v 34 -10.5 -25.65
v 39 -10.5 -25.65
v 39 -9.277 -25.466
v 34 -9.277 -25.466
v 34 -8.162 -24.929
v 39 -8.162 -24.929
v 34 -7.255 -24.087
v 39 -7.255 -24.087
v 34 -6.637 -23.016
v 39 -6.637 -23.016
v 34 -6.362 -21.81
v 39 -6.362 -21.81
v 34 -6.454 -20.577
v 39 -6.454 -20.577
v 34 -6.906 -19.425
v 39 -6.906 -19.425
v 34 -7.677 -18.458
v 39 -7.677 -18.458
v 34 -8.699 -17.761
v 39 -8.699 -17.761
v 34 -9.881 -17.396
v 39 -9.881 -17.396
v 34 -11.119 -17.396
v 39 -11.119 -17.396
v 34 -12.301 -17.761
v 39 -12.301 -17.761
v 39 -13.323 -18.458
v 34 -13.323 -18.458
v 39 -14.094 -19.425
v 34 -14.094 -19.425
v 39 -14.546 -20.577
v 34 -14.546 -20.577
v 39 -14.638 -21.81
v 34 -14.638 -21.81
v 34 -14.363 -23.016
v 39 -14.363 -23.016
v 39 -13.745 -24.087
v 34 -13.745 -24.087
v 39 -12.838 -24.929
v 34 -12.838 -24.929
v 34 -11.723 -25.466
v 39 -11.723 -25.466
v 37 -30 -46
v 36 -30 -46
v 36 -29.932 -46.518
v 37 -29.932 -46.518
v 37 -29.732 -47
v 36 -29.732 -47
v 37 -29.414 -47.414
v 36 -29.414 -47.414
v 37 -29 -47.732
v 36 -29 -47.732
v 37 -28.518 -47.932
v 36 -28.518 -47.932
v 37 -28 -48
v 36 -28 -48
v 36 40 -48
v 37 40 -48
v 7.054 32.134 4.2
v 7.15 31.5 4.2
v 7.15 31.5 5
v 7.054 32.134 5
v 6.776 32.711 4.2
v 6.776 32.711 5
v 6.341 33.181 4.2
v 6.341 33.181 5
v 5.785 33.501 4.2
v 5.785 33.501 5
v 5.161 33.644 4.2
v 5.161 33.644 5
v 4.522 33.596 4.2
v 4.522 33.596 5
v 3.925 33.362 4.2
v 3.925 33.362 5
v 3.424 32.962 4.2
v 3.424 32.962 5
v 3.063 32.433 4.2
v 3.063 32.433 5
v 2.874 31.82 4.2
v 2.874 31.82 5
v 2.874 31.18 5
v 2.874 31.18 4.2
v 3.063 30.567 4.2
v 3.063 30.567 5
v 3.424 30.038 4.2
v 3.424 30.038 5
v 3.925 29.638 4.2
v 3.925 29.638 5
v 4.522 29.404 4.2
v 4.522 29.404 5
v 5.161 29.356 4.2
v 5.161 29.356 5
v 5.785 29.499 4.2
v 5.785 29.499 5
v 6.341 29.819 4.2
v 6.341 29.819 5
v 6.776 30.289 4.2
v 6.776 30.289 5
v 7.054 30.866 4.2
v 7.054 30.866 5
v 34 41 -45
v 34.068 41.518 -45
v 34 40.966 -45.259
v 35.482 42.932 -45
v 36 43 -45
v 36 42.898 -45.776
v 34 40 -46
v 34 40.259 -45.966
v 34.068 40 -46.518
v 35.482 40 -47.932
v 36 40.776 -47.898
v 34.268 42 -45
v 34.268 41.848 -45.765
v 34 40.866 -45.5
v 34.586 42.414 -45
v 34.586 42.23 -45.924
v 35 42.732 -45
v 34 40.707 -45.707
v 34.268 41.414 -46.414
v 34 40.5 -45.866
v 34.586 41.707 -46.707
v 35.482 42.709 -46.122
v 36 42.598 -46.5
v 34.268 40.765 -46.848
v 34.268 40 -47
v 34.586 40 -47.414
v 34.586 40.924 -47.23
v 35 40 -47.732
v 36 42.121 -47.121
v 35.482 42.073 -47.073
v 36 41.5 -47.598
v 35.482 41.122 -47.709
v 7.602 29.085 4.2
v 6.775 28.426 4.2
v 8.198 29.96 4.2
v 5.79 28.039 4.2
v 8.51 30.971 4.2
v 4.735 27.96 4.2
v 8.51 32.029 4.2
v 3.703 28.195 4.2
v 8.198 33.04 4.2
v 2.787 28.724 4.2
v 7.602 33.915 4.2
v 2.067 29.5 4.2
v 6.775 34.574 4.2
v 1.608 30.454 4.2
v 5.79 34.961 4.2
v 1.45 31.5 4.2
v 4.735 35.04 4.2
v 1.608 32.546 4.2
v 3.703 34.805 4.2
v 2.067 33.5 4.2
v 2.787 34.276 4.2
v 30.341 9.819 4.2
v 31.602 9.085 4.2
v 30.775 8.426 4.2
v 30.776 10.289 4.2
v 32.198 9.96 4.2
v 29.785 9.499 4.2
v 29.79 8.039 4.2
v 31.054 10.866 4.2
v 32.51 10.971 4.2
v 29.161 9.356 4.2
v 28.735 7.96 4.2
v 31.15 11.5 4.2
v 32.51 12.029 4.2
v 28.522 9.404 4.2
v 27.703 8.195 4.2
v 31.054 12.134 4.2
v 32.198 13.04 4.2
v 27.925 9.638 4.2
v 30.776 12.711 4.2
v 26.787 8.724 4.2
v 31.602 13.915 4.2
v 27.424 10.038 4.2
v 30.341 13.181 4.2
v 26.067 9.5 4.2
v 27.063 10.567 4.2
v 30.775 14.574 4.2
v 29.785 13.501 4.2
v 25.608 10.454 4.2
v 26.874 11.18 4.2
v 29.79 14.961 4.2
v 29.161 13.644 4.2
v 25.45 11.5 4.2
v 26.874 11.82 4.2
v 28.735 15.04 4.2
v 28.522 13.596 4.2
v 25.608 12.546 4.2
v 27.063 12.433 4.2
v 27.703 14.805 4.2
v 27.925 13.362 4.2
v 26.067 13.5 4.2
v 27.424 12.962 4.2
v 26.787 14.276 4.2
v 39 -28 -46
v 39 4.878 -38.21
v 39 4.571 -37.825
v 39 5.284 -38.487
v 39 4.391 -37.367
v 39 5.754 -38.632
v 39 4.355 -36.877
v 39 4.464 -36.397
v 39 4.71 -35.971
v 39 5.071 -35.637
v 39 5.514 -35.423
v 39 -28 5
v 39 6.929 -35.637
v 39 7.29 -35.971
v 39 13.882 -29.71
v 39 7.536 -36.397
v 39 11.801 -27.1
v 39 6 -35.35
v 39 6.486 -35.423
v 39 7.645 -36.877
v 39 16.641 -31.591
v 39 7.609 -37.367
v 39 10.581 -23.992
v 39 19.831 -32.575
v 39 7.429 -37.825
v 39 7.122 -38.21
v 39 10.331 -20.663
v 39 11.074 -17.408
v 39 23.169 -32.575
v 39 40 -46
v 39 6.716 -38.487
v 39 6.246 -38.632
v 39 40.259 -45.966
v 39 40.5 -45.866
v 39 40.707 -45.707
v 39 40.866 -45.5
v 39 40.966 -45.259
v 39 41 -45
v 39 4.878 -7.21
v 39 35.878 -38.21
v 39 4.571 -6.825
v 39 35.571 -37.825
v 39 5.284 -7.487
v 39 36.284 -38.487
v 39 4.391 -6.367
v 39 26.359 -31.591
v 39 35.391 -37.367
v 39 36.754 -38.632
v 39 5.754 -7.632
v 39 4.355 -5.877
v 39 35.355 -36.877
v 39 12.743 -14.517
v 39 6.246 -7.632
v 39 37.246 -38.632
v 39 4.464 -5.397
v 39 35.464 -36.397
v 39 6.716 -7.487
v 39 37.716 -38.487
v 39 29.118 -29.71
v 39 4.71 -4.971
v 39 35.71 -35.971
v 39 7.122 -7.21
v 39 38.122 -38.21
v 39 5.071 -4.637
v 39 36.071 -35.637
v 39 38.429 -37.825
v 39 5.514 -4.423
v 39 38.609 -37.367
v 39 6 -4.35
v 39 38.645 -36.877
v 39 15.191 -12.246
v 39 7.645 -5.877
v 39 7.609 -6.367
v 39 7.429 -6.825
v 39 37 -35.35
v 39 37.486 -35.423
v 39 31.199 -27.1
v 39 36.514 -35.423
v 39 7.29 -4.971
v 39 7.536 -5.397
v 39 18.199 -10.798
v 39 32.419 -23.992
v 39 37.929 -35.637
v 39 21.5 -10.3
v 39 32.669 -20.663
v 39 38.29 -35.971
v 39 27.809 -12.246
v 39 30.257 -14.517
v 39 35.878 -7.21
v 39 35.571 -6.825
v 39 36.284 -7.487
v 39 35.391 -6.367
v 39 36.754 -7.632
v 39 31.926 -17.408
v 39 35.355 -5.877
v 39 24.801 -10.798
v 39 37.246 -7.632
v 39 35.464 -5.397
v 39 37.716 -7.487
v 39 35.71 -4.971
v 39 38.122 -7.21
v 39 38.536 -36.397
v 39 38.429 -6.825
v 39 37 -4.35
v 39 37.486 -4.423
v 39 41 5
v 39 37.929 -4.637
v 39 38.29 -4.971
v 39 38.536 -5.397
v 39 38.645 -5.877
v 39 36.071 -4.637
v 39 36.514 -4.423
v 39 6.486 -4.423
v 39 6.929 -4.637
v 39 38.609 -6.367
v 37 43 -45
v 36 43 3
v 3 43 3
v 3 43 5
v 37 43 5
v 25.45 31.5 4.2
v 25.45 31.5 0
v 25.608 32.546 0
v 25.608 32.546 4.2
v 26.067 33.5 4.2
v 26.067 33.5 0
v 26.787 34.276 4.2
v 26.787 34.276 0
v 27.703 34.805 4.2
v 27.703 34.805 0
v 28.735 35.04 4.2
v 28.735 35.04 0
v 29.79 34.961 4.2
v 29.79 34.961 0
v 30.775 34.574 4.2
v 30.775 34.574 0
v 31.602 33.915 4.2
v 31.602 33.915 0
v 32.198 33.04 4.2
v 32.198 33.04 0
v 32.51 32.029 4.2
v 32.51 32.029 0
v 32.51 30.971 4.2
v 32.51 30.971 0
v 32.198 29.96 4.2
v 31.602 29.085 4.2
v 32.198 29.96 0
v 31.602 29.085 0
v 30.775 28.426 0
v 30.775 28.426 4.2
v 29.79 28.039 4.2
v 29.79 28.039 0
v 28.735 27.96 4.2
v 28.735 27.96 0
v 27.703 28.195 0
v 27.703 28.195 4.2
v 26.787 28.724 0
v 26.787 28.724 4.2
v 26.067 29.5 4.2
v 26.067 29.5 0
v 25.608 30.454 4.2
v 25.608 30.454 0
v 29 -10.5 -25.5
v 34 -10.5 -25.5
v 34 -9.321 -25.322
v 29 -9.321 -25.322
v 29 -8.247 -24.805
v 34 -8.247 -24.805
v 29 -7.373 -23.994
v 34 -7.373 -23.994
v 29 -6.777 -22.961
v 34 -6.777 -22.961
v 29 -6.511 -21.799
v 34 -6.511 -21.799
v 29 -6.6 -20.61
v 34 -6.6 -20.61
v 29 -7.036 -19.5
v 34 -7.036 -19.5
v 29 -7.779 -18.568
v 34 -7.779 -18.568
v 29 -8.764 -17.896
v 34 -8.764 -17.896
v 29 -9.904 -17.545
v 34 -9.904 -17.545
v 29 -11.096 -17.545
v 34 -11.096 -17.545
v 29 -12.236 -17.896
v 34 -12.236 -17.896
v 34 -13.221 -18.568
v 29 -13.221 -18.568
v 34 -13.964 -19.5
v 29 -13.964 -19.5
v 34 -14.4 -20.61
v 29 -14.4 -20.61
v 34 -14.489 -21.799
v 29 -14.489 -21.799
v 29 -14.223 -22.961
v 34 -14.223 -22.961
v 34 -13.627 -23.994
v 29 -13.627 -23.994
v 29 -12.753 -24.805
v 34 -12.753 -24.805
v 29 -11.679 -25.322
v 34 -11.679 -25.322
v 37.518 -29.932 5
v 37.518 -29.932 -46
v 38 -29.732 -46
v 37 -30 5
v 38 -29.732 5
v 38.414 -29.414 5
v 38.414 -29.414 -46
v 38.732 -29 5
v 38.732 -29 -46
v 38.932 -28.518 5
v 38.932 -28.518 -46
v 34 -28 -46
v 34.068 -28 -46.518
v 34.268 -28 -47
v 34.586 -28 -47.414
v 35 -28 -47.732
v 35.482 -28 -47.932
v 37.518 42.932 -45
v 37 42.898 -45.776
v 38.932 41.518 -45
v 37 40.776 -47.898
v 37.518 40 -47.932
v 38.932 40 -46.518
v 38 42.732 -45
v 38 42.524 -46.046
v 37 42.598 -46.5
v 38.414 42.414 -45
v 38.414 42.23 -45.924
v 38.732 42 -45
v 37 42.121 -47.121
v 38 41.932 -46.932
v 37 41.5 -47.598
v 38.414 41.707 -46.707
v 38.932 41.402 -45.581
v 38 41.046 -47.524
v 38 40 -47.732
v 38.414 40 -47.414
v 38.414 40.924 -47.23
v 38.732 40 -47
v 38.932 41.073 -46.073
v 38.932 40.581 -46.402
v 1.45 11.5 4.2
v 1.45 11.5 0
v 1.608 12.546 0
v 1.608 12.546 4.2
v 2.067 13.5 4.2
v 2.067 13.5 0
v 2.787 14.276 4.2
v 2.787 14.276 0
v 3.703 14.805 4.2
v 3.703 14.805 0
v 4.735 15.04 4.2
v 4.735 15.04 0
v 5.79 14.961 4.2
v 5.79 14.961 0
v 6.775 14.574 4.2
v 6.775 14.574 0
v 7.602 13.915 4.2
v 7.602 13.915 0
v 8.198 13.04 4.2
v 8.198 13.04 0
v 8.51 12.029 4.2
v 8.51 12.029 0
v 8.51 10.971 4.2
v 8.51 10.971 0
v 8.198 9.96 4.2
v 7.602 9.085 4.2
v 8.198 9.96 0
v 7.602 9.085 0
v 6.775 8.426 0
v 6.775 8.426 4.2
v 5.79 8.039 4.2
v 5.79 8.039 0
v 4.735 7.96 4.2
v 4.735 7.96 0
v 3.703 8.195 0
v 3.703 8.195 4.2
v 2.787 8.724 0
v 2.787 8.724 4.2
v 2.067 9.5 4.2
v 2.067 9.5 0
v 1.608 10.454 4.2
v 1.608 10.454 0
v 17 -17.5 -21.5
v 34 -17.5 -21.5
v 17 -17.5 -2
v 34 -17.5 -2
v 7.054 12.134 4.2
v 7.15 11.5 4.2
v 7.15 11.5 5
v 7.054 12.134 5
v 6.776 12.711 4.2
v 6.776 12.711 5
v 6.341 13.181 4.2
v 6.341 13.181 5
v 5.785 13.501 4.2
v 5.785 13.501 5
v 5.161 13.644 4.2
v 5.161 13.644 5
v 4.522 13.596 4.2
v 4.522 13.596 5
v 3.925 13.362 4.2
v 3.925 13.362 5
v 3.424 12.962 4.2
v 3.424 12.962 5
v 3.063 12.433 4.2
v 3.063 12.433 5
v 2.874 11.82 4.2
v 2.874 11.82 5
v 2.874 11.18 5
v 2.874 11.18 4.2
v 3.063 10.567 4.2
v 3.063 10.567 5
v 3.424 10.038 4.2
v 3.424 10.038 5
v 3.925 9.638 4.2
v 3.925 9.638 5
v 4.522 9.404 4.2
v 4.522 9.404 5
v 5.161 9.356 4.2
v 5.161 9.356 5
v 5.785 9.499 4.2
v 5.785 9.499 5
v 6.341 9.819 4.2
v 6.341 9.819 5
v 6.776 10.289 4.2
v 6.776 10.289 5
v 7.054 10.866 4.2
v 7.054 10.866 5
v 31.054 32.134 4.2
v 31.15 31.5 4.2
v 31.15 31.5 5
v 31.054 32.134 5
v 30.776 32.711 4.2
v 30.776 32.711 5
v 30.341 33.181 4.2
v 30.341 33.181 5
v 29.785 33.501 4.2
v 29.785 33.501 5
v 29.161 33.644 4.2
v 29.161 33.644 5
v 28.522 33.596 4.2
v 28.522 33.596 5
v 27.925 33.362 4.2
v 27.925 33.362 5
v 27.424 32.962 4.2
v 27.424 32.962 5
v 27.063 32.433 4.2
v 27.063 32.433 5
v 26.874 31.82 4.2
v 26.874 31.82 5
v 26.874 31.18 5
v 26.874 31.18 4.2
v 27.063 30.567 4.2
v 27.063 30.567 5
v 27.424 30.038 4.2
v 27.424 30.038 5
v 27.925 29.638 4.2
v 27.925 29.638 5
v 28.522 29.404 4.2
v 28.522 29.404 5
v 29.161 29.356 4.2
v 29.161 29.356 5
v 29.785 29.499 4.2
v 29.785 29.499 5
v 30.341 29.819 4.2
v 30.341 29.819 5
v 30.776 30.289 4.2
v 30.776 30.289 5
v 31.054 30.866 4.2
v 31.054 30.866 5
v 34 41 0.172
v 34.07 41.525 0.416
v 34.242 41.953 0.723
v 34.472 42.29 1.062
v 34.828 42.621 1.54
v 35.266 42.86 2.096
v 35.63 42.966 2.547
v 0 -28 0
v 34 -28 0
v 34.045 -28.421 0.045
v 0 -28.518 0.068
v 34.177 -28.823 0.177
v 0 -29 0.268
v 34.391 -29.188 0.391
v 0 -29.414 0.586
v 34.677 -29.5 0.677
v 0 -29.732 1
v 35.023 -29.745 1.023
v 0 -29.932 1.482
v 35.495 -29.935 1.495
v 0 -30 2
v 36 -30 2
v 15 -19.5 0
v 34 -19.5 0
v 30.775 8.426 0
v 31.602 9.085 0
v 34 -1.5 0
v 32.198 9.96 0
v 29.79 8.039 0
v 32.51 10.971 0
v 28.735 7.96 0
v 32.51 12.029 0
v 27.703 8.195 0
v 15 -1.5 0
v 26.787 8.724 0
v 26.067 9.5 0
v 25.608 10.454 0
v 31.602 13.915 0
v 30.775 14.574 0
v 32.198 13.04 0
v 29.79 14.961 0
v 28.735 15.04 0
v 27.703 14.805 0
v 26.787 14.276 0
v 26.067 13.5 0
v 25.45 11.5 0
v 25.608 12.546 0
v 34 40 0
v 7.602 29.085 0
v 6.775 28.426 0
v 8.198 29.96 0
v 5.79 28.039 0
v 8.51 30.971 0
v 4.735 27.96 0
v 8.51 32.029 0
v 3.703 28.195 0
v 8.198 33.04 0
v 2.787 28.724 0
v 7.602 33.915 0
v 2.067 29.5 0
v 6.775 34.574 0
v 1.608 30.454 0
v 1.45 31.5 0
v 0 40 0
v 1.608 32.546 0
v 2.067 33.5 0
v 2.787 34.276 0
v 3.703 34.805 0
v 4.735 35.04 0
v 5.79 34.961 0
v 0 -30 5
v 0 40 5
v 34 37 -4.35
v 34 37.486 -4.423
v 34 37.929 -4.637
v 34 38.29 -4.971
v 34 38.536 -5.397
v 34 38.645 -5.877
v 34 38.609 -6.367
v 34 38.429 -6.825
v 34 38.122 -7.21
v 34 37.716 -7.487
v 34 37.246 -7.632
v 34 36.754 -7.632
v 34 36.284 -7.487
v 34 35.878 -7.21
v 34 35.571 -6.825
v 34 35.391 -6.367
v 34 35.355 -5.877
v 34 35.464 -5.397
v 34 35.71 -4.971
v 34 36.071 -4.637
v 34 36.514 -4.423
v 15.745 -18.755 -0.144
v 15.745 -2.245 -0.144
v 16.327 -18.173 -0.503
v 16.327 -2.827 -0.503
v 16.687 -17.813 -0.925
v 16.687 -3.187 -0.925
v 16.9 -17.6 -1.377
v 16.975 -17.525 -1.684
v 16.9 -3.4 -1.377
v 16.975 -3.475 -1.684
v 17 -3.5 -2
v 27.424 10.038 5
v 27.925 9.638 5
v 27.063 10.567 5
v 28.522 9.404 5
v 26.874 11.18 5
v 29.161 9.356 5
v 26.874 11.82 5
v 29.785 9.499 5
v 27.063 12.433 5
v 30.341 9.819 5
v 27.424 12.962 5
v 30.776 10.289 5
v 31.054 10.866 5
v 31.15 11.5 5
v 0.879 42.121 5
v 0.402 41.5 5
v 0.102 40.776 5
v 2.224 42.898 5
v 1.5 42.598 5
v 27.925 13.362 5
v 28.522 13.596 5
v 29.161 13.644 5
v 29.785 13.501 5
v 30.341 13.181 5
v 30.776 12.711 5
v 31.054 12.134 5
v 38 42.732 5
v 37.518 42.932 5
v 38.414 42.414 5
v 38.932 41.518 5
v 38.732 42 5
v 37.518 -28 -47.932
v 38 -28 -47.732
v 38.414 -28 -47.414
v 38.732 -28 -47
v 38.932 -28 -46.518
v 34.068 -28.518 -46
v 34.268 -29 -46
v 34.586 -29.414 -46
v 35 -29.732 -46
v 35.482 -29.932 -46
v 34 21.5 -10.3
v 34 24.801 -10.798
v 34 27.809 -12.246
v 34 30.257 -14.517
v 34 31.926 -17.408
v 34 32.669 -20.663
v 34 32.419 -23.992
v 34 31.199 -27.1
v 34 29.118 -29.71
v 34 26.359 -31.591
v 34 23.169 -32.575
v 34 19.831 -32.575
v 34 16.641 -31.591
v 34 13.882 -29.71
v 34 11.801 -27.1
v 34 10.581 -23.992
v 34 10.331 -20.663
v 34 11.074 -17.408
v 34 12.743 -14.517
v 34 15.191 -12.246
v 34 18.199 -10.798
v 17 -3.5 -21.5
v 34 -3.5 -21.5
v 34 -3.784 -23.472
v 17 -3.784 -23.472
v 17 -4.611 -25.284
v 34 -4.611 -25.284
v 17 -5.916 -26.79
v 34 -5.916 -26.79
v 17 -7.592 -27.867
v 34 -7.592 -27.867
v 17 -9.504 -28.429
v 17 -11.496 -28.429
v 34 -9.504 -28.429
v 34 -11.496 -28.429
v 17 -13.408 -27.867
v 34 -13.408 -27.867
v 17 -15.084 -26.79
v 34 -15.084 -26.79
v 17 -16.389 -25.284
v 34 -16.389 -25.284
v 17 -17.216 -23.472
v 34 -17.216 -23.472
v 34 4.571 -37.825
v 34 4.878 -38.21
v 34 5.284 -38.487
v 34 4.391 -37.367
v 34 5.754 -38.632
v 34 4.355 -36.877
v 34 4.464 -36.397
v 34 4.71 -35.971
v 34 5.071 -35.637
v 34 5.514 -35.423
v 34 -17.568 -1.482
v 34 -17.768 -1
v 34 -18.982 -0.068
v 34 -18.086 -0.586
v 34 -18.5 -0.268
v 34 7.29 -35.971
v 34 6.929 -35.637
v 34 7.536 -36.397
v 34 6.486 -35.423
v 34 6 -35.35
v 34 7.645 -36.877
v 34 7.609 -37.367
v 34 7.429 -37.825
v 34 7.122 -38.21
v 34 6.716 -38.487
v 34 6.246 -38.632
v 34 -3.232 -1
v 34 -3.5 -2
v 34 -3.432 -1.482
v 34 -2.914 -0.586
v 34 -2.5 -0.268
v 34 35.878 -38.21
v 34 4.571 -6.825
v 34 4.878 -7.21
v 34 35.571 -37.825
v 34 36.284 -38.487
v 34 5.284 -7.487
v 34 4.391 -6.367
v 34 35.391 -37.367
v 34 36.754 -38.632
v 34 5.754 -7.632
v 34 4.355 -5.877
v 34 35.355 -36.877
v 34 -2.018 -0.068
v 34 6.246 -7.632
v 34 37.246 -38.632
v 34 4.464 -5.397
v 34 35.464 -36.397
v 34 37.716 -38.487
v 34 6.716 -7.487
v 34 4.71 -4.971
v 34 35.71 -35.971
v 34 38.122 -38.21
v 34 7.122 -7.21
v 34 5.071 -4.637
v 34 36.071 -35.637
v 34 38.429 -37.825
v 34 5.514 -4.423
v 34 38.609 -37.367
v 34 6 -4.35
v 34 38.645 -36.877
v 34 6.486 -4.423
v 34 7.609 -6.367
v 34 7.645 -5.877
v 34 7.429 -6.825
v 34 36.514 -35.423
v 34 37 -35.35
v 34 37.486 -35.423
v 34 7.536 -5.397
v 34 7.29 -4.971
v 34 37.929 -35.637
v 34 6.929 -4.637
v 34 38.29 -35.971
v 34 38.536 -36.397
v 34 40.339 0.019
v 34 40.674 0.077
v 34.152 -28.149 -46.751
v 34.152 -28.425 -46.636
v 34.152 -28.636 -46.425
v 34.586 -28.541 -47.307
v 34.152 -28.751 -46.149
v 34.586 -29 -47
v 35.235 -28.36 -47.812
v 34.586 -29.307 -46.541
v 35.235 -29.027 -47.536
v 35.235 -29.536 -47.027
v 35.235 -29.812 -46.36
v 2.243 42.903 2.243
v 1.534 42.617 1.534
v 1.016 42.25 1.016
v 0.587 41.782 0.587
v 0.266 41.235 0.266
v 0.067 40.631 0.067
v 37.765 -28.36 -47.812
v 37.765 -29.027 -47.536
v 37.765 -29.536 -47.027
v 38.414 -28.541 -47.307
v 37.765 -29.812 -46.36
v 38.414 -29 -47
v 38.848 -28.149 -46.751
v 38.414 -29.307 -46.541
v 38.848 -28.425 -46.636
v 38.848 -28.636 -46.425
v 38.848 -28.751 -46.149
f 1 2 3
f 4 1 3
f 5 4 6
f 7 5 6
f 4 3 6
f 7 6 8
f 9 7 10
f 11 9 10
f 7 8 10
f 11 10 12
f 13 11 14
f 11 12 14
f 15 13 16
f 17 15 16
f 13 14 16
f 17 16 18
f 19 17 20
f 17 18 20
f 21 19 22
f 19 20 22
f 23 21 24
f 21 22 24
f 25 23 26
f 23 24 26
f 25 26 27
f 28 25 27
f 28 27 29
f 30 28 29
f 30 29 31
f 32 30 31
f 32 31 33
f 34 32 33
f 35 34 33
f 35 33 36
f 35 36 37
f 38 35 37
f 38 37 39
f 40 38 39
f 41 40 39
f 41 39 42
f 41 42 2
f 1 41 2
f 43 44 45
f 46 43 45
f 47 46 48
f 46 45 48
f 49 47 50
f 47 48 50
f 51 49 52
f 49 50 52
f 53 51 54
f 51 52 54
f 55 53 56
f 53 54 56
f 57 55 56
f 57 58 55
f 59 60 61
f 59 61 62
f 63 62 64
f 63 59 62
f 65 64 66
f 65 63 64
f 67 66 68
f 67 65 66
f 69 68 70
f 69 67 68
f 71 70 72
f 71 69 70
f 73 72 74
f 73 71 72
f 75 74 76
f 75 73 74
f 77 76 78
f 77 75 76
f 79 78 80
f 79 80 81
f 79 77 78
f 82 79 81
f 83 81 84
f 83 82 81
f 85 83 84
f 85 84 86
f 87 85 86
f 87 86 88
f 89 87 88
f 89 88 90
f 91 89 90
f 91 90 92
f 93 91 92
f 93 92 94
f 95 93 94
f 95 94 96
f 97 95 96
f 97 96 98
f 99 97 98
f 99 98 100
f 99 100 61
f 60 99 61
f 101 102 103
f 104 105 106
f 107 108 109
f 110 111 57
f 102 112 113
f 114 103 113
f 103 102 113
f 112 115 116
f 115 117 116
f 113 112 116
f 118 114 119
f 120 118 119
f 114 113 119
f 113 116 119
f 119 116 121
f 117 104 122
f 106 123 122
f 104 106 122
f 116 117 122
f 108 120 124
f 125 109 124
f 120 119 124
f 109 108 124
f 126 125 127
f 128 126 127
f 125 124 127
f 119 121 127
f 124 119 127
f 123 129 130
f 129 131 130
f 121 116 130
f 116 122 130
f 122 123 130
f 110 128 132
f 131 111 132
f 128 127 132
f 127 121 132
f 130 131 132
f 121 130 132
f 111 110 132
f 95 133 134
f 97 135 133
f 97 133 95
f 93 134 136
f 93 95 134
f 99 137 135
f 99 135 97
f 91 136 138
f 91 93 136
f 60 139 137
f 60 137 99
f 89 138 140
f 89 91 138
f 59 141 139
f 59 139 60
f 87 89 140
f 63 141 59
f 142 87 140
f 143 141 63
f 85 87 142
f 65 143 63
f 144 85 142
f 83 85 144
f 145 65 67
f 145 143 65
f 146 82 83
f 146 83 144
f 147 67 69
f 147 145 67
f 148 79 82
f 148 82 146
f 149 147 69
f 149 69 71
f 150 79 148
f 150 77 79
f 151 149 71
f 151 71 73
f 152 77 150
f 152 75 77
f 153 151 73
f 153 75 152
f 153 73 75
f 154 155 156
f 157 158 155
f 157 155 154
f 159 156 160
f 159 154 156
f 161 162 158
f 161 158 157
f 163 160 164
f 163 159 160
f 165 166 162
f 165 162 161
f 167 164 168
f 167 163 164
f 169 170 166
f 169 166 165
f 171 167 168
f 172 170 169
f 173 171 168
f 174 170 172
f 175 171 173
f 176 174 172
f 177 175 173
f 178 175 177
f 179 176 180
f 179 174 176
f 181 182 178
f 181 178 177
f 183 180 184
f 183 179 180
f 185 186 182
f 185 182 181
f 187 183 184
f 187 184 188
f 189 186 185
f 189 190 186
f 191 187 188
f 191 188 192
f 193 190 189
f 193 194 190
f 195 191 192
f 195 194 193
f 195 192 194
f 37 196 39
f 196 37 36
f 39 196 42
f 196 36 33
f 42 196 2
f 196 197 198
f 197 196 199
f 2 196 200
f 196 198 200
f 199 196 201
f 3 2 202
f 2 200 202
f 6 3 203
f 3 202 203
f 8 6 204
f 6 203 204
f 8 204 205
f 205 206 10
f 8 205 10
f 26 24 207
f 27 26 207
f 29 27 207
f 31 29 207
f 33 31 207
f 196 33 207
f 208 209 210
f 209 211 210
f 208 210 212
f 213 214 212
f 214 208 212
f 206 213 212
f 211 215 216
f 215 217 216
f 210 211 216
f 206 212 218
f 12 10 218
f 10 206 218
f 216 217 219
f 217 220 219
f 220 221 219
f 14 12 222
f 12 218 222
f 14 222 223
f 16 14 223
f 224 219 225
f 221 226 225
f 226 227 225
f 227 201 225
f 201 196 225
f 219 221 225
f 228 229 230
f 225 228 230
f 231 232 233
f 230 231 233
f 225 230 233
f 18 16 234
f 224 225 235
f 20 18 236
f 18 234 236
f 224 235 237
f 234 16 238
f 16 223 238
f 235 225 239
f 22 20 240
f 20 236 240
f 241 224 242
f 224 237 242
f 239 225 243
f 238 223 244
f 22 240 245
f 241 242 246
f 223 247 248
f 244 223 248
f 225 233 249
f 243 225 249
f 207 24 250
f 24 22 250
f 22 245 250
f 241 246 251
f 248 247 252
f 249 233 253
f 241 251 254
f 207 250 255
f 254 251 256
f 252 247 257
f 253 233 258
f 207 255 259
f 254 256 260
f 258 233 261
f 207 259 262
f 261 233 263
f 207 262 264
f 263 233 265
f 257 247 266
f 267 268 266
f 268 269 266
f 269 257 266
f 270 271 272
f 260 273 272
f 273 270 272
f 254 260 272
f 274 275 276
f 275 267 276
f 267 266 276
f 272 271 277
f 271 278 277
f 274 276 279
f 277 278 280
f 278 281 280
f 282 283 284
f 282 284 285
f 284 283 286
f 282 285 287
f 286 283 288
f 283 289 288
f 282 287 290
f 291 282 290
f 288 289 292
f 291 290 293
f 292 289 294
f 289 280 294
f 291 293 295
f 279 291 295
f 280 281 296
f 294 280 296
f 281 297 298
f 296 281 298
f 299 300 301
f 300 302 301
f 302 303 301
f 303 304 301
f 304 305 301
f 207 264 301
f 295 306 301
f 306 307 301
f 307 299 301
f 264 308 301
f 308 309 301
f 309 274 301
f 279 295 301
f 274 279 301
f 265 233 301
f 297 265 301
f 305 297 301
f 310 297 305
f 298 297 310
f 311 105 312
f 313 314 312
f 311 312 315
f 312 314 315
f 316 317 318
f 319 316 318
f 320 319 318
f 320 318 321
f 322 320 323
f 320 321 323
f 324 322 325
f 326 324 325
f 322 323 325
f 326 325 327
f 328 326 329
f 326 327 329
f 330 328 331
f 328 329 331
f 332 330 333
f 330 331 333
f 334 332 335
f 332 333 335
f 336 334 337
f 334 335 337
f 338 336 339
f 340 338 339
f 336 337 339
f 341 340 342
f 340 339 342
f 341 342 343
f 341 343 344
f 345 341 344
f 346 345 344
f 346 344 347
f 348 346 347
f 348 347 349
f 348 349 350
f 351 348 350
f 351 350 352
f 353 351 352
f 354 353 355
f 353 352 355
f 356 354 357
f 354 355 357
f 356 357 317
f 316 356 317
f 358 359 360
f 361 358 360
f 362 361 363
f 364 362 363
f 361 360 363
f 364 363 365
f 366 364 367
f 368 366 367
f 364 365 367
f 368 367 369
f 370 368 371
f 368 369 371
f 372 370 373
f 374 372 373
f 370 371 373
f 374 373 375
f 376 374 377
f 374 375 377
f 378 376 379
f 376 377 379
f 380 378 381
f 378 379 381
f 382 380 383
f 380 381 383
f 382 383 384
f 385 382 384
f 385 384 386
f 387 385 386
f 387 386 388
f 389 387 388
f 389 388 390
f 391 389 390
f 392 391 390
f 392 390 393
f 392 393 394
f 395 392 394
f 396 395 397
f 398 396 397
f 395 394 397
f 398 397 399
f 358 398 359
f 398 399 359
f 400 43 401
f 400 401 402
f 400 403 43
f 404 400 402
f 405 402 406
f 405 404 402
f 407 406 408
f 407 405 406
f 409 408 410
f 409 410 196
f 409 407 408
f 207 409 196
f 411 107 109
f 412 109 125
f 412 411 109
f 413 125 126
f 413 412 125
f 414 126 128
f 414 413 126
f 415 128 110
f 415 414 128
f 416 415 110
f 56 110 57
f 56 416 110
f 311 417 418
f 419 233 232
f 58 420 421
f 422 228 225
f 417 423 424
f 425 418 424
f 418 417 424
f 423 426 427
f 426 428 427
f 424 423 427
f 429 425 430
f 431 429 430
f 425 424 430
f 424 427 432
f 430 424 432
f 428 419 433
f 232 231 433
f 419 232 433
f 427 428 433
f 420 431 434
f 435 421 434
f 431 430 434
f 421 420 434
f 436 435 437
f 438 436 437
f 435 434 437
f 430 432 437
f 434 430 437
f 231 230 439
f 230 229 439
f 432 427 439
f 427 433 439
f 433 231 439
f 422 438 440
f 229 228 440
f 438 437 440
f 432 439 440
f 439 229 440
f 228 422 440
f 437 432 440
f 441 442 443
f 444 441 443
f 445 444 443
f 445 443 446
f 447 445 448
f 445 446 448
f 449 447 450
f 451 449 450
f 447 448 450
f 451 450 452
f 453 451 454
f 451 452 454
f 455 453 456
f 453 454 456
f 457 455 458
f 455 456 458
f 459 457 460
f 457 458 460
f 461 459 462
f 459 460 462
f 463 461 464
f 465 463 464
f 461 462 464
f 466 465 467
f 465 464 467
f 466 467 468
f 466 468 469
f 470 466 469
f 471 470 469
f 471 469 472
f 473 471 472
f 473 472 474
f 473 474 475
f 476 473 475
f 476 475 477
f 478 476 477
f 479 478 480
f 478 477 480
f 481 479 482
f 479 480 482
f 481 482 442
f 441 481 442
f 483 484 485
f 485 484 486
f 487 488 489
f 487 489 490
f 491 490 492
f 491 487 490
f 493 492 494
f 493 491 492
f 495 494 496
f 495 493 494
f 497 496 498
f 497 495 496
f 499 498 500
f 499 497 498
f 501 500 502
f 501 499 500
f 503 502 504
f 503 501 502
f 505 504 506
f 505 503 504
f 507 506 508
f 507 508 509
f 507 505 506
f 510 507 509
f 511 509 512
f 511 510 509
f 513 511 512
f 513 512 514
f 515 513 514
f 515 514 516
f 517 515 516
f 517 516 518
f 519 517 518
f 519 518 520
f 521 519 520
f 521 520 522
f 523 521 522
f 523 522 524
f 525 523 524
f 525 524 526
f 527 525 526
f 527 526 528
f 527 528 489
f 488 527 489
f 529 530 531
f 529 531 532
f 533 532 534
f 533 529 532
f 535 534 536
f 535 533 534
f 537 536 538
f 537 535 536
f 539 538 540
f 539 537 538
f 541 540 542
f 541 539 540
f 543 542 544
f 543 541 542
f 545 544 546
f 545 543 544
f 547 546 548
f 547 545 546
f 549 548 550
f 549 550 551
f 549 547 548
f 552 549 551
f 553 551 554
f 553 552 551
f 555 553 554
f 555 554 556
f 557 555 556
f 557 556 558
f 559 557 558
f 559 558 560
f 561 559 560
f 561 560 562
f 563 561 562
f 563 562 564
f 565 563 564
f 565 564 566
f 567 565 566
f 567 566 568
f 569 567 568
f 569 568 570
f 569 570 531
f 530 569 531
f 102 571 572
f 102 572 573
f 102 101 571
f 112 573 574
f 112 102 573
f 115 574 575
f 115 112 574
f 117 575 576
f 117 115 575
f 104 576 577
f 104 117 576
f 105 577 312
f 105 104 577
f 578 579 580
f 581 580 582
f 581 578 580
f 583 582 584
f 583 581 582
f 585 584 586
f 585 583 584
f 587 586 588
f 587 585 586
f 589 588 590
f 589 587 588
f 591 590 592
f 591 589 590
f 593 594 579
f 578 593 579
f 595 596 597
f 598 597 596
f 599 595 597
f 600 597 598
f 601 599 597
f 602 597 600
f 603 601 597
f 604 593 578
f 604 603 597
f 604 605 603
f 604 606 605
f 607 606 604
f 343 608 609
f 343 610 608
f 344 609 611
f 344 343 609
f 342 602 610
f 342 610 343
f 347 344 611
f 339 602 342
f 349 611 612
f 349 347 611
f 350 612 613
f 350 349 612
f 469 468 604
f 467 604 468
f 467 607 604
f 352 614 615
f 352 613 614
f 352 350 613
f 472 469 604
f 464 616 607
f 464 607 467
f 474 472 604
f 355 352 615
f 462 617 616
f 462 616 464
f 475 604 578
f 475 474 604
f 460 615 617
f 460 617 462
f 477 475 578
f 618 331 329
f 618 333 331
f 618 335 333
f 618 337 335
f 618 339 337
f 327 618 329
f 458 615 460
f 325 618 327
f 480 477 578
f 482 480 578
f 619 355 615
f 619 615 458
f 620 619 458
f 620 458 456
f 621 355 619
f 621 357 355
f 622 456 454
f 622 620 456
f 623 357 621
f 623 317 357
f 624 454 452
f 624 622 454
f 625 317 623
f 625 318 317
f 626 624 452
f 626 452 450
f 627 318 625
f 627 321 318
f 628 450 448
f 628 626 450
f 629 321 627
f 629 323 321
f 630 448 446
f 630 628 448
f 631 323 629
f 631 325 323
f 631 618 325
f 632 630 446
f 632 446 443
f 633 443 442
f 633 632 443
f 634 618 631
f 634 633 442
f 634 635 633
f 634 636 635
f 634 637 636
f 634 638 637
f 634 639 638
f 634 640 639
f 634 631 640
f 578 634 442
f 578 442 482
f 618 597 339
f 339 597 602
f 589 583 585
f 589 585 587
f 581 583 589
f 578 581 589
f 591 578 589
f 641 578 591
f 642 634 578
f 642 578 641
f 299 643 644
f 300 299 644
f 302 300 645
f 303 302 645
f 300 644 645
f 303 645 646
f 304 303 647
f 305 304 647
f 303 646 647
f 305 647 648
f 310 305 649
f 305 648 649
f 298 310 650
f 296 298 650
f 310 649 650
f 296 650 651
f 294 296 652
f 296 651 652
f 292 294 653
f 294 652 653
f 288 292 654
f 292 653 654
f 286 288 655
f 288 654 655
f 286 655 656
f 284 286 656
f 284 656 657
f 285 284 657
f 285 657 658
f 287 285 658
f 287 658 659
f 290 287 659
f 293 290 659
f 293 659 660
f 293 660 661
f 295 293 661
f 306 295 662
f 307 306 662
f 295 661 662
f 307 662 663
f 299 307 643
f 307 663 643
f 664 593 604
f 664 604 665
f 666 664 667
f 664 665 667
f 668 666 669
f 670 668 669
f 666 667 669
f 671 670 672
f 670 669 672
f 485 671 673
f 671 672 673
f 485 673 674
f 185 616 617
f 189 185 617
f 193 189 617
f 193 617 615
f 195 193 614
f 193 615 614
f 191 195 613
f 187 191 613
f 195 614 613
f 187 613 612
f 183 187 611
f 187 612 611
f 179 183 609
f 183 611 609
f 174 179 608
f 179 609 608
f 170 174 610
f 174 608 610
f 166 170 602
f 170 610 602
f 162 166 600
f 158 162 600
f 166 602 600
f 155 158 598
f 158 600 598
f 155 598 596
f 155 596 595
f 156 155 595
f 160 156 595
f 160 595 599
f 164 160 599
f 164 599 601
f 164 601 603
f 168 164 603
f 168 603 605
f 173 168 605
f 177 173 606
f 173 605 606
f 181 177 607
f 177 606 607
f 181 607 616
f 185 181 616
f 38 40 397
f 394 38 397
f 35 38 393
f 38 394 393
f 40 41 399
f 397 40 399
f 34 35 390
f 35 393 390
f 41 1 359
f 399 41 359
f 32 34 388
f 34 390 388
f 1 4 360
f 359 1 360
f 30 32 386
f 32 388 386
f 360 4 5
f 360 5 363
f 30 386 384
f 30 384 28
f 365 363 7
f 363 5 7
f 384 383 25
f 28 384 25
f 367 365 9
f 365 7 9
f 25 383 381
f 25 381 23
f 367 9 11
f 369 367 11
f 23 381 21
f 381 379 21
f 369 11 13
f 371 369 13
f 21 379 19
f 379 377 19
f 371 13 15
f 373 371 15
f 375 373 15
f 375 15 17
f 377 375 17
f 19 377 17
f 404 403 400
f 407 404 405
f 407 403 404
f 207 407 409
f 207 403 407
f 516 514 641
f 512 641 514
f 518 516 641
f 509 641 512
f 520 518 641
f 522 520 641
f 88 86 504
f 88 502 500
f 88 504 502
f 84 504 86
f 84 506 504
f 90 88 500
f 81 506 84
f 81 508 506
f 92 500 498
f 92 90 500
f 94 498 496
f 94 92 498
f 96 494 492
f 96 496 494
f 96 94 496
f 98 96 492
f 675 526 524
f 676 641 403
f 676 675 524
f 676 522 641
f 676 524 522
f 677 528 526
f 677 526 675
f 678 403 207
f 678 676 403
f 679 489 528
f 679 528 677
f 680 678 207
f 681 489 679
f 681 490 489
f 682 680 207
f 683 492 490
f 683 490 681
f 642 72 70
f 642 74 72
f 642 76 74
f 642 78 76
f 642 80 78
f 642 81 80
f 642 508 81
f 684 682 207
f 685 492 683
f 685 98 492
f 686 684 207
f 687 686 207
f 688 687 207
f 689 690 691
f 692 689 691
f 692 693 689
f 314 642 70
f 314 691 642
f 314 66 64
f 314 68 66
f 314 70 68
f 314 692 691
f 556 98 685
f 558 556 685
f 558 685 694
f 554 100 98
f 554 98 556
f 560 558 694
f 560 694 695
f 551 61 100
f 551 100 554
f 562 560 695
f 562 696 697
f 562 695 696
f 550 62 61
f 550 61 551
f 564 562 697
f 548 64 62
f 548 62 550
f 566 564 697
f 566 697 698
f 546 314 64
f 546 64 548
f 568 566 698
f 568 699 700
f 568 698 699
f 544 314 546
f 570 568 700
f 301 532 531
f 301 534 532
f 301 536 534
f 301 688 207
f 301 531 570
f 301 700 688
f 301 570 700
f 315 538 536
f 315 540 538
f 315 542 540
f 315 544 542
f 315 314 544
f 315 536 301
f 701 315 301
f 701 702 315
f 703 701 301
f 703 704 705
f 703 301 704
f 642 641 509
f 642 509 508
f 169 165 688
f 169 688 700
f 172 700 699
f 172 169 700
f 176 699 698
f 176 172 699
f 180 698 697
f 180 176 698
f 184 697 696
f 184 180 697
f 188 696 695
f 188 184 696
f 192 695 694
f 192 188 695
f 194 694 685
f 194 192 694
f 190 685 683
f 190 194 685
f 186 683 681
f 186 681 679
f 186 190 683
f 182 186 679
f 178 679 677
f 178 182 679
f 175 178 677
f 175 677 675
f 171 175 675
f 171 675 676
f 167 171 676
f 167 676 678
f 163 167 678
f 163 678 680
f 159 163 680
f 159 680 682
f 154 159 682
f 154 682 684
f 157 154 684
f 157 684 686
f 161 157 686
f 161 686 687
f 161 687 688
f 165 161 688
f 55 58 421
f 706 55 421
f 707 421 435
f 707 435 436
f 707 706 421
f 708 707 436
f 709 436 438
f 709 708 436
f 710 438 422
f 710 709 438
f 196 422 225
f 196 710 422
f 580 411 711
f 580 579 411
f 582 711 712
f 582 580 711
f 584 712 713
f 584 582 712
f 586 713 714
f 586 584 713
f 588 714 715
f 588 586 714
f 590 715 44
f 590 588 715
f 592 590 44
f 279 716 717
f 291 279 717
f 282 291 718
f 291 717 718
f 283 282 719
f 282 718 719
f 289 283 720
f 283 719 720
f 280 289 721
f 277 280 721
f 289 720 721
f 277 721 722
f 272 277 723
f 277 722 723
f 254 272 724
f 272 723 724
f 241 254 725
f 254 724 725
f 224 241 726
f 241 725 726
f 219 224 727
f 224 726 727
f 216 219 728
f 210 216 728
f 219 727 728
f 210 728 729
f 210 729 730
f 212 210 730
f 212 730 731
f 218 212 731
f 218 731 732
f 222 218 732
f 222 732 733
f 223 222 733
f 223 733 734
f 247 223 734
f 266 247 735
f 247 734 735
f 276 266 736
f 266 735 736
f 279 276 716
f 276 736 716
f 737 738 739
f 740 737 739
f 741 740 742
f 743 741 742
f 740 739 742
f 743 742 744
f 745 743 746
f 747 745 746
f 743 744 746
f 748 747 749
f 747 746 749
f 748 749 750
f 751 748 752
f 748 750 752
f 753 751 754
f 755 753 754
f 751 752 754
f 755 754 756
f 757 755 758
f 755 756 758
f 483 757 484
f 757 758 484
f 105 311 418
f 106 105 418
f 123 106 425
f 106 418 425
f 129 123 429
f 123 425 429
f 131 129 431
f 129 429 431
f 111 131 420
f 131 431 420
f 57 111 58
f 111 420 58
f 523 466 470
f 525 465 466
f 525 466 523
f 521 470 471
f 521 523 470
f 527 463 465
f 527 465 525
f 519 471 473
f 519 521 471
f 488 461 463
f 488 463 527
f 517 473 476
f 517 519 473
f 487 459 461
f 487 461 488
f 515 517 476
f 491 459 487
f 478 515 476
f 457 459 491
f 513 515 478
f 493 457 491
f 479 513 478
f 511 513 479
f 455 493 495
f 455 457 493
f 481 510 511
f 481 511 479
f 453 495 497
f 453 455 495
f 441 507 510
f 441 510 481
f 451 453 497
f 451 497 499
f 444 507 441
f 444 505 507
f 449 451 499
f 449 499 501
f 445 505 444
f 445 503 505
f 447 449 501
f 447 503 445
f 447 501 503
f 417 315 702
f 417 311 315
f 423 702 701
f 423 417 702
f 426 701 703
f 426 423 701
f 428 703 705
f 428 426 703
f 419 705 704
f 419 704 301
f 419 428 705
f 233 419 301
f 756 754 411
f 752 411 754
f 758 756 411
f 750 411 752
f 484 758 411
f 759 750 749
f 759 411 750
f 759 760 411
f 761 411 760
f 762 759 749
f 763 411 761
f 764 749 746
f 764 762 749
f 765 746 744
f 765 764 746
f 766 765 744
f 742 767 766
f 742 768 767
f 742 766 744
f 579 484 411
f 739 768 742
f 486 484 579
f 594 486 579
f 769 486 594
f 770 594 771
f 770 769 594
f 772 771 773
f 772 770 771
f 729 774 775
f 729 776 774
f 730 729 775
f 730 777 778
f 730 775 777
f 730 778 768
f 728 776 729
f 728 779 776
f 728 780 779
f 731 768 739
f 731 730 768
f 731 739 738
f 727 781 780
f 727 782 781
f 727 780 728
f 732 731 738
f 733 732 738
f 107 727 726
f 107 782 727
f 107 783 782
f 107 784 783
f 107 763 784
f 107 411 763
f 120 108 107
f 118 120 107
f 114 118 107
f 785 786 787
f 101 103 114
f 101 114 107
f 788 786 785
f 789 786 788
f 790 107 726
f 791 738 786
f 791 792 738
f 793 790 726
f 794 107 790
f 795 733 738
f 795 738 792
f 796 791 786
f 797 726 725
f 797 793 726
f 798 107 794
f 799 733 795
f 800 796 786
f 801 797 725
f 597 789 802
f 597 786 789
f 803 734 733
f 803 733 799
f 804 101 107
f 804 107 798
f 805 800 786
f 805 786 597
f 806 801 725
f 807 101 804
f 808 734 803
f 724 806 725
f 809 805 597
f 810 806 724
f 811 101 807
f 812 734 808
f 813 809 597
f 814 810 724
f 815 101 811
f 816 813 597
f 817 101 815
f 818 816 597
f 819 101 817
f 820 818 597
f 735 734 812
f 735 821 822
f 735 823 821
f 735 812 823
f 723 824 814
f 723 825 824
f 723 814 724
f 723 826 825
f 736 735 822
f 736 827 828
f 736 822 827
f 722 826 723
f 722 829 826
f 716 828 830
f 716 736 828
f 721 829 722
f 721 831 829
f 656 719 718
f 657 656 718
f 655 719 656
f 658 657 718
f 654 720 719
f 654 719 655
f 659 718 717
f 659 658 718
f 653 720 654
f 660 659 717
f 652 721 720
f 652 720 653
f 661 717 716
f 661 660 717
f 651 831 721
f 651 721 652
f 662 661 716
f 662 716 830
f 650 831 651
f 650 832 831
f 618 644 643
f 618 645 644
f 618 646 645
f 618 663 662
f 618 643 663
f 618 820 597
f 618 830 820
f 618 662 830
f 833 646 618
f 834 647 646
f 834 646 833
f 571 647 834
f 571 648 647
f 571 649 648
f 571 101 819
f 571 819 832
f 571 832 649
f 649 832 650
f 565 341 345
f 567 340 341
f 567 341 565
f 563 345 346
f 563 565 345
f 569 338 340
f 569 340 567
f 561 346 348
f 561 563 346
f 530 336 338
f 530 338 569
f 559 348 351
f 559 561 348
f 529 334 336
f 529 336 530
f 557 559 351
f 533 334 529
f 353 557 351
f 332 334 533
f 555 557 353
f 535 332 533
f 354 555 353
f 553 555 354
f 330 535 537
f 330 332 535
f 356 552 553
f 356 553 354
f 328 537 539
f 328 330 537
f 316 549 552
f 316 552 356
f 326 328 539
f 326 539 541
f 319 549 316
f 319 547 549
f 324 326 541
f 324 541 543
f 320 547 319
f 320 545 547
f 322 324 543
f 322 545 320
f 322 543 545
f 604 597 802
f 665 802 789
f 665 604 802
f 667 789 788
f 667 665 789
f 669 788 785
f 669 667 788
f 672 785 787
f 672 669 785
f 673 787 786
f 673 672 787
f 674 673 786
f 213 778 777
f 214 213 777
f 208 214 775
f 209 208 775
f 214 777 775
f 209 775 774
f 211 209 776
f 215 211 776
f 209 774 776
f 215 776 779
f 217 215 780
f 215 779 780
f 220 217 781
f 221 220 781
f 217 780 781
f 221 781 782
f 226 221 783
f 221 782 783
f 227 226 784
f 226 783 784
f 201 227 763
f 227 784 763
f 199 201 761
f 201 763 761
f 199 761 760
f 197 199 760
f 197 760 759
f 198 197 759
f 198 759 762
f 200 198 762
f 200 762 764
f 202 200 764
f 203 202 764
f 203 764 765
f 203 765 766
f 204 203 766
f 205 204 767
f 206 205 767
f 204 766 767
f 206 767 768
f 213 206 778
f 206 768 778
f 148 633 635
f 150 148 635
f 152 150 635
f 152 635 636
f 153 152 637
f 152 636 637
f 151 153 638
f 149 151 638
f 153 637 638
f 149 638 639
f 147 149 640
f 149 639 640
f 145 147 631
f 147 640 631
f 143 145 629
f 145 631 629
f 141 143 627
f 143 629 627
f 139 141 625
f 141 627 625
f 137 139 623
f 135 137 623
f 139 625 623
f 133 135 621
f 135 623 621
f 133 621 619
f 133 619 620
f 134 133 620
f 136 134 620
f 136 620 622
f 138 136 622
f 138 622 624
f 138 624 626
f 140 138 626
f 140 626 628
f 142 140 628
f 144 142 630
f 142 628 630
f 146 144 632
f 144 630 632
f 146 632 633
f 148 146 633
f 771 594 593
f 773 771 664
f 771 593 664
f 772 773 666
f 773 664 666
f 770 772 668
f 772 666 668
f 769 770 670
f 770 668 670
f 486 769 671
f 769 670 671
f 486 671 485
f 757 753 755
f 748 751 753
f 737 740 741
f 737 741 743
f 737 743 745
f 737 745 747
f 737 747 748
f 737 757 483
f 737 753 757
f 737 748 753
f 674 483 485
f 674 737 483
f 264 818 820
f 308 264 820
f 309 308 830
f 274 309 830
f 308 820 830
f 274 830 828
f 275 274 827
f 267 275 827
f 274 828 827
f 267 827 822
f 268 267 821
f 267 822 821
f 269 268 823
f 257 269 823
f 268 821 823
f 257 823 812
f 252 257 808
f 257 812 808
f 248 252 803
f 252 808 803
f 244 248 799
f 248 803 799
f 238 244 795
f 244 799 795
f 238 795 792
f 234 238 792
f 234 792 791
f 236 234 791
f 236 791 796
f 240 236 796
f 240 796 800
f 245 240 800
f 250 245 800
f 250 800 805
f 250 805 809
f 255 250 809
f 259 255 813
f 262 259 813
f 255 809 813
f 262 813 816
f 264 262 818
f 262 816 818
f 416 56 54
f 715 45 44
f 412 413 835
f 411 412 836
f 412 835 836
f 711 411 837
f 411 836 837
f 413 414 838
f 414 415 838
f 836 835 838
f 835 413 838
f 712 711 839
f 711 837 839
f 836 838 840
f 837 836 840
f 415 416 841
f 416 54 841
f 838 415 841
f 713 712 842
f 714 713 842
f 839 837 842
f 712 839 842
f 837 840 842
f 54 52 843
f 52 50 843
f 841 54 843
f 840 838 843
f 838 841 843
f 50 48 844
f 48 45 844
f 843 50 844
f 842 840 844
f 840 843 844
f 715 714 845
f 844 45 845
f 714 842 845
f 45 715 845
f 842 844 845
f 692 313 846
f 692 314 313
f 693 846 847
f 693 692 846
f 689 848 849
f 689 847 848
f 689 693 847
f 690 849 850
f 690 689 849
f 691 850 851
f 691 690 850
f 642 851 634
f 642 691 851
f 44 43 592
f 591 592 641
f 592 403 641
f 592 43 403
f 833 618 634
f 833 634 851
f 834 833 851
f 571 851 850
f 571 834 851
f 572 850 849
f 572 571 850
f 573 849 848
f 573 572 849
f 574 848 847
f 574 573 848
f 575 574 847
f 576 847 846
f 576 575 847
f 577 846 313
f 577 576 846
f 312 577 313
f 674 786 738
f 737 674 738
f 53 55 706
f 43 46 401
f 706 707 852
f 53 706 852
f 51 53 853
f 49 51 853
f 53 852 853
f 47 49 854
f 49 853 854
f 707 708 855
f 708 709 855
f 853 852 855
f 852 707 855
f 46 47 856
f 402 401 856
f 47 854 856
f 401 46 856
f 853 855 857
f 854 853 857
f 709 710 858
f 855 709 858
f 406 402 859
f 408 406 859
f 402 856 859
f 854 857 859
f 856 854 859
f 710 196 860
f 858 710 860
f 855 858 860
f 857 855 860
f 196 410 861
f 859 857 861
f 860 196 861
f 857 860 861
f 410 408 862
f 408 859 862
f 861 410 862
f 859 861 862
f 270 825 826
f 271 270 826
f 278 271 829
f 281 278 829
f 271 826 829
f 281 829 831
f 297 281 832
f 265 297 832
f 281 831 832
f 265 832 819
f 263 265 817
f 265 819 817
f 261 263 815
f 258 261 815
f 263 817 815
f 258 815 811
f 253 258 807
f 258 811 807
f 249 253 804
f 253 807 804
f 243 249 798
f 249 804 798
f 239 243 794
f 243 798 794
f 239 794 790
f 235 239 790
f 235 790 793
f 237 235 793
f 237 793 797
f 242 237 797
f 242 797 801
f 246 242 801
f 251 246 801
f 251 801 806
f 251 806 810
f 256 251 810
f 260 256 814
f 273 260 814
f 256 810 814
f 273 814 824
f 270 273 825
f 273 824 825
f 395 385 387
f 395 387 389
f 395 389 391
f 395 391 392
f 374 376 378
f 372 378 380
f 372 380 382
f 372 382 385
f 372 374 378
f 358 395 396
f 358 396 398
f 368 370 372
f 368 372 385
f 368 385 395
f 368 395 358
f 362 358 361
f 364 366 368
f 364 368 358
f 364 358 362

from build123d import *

# Parameters (mm, degrees)
SKETCH1_W           = 34
SKETCH1_H           = 43
SKETCH1_R           = 2.15
BOSS_EXTRUDE2_DEPTH = 5
SKETCH2_W           = 5
SKETCH2_H           = 43
BOSS_EXTRUDE3_DEPTH = 53
SKETCH3_R           = 3.55
SKETCH3_R_2         = 2.15
CUT_EXTRUDE1_DEPTH  = 4.2
SKETCH5_R           = 1.65
SKETCH5_R_2         = 11.2
CUT_EXTRUDE2_DEPTH  = 5
FILLET1_R           = 3
BOSS_EXTRUDE6_DEPTH = 30
SKETCH9_R           = 4.15
CUT_EXTRUDE3_DEPTH  = 10
BOSS_EXTRUDE9_DEPTH = 17
SKETCH11_R          = 4
CUT_EXTRUDE4_DEPTH  = 5
FILLET5_R           = 2
FILLET6_R           = 2
FILLET7_R           = 2


with BuildPart() as part:
    # Sketch1 → Boss-Extrude2 (new body)
    with BuildSketch(Plane.XY):
        with Locations((17, 21.5)):
            Rectangle(SKETCH1_W, SKETCH1_H)
        with Locations((5, 31.5)):
            Circle(SKETCH1_R, mode=Mode.SUBTRACT)
        with Locations((29, 31.5)):
            Circle(SKETCH1_R, mode=Mode.SUBTRACT)
        with Locations((5, 11.5)):
            Circle(SKETCH1_R, mode=Mode.SUBTRACT)
        with Locations((29, 11.5)):
            Circle(SKETCH1_R, mode=Mode.SUBTRACT)
    extrude(amount=BOSS_EXTRUDE2_DEPTH)

    # Sketch2 → Boss-Extrude3 (add)
    with BuildSketch(Plane.XY.offset(5)):
        with Locations((36.5, 21.5)):
            Rectangle(SKETCH2_W, SKETCH2_H)
    extrude(amount=-BOSS_EXTRUDE3_DEPTH)

    # Sketch3 → Cut-Extrude1 (cut)
    with BuildSketch(Plane(origin=(0, 0, 0), x_dir=(-1, 0, 0), z_dir=(0, 0, -1))):
        with Locations((-29, 31.5)):
            Circle(SKETCH3_R)
        with Locations((-29, 31.5)):
            Circle(SKETCH3_R_2, mode=Mode.SUBTRACT)
        with Locations((-5, 31.5)):
            Circle(SKETCH3_R)
        with Locations((-5, 31.5)):
            Circle(SKETCH3_R_2, mode=Mode.SUBTRACT)
        with Locations((-5, 11.5)):
            Circle(SKETCH3_R)
        with Locations((-5, 11.5)):
            Circle(SKETCH3_R_2, mode=Mode.SUBTRACT)
        with Locations((-29, 11.5)):
            Circle(SKETCH3_R)
        with Locations((-29, 11.5)):
            Circle(SKETCH3_R_2, mode=Mode.SUBTRACT)
    extrude(amount=-CUT_EXTRUDE1_DEPTH, mode=Mode.SUBTRACT)

    # Sketch5 → Cut-Extrude2 (cut)
    with BuildSketch(Plane.ZY.offset(-34)):
        with Locations((-6, 6)):
            Circle(SKETCH5_R)
        with Locations((-37, 6)):
            Circle(SKETCH5_R)
        with Locations((-37, 37)):
            Circle(SKETCH5_R)
        with Locations((-21.5, 21.5)):
            Circle(SKETCH5_R_2)
        with Locations((-6, 37)):
            Circle(SKETCH5_R)
    extrude(amount=-CUT_EXTRUDE2_DEPTH, mode=Mode.SUBTRACT)

    # Fillet1
    fillet1_edges = [part.edges().sort_by_distance(p)[0] for p in [
        (36.5, 43, -48),
        (17, 43, 0),
        (0, 43, 2.5),
    ]]
    fillet(fillet1_edges, radius=FILLET1_R)

    # Sketch7 → Boss-Extrude6 (add)
    with BuildSketch(Plane.XZ):
        Polygon((0, 5), (39, 5), (39, 0), (39, -48), (34, -48), (34, 0), (0, 0), align=None)
    extrude(amount=BOSS_EXTRUDE6_DEPTH)

    # Sketch9 → Cut-Extrude3 (cut)
    with BuildSketch(Plane(origin=(39, 0, 0), x_dir=(0, 0, -1), z_dir=(1, 0, 0))):
        with Locations((21.5, -10.5)):
            Circle(SKETCH9_R)
    extrude(amount=-CUT_EXTRUDE3_DEPTH, mode=Mode.SUBTRACT)

    # Sketch10 → Boss-Extrude9 (add)
    with BuildSketch(Plane.ZY.offset(-34)):
        with BuildLine():
            Line((0, -3.5), (-21.5, -3.5))
            ThreePointArc((-21.5, -3.5), (-28.5, -10.5), (-21.5, -17.5))
            Line((-21.5, -17.5), (0, -17.5))
            Line((0, -17.5), (0, -3.5))
        make_face()
    extrude(amount=BOSS_EXTRUDE9_DEPTH)

    # Sketch11 → Cut-Extrude4 (cut)
    with BuildSketch(Plane(origin=(34, 0, 0), x_dir=(0, 0, -1), z_dir=(1, 0, 0))):
        with Locations((21.5, -10.5)):
            Circle(SKETCH11_R)
    extrude(amount=-CUT_EXTRUDE4_DEPTH, mode=Mode.SUBTRACT)

    # Fillet5
    fillet5_edges = [part.edges().sort_by_distance(p)[0] for p in [
        (17, -30, 0),
        (36.5, -30, -48),
    ]]
    fillet(fillet5_edges, radius=FILLET5_R)

    # Fillet6
    fillet6_edges = [part.edges().sort_by_distance(p)[0] for p in [
        (25.5, -3.5, 0),
        (25.5, -17.5, 0),
        (17, -10.5, 0),
    ]]
    fillet(fillet6_edges, radius=FILLET6_R)

    # Fillet7
    fillet7_edges = [part.edges().sort_by_distance(p)[0] for p in [
        (39, -30, -20.5),
        (39, -29.414213562, -47.414213562),
        (39, 43, -20),
        (39, 42.121320344, -47.121320344),
        (34, 43, -21),
        (34, 42.121320344, -47.121320344),
        (34, -30, -23),
        (34, -29.414213562, -47.414213562),
        (39, 6, -48),
        (34, 6, -48),
    ]]
    fillet(fillet7_edges, radius=FILLET7_R)


solid = part.part
